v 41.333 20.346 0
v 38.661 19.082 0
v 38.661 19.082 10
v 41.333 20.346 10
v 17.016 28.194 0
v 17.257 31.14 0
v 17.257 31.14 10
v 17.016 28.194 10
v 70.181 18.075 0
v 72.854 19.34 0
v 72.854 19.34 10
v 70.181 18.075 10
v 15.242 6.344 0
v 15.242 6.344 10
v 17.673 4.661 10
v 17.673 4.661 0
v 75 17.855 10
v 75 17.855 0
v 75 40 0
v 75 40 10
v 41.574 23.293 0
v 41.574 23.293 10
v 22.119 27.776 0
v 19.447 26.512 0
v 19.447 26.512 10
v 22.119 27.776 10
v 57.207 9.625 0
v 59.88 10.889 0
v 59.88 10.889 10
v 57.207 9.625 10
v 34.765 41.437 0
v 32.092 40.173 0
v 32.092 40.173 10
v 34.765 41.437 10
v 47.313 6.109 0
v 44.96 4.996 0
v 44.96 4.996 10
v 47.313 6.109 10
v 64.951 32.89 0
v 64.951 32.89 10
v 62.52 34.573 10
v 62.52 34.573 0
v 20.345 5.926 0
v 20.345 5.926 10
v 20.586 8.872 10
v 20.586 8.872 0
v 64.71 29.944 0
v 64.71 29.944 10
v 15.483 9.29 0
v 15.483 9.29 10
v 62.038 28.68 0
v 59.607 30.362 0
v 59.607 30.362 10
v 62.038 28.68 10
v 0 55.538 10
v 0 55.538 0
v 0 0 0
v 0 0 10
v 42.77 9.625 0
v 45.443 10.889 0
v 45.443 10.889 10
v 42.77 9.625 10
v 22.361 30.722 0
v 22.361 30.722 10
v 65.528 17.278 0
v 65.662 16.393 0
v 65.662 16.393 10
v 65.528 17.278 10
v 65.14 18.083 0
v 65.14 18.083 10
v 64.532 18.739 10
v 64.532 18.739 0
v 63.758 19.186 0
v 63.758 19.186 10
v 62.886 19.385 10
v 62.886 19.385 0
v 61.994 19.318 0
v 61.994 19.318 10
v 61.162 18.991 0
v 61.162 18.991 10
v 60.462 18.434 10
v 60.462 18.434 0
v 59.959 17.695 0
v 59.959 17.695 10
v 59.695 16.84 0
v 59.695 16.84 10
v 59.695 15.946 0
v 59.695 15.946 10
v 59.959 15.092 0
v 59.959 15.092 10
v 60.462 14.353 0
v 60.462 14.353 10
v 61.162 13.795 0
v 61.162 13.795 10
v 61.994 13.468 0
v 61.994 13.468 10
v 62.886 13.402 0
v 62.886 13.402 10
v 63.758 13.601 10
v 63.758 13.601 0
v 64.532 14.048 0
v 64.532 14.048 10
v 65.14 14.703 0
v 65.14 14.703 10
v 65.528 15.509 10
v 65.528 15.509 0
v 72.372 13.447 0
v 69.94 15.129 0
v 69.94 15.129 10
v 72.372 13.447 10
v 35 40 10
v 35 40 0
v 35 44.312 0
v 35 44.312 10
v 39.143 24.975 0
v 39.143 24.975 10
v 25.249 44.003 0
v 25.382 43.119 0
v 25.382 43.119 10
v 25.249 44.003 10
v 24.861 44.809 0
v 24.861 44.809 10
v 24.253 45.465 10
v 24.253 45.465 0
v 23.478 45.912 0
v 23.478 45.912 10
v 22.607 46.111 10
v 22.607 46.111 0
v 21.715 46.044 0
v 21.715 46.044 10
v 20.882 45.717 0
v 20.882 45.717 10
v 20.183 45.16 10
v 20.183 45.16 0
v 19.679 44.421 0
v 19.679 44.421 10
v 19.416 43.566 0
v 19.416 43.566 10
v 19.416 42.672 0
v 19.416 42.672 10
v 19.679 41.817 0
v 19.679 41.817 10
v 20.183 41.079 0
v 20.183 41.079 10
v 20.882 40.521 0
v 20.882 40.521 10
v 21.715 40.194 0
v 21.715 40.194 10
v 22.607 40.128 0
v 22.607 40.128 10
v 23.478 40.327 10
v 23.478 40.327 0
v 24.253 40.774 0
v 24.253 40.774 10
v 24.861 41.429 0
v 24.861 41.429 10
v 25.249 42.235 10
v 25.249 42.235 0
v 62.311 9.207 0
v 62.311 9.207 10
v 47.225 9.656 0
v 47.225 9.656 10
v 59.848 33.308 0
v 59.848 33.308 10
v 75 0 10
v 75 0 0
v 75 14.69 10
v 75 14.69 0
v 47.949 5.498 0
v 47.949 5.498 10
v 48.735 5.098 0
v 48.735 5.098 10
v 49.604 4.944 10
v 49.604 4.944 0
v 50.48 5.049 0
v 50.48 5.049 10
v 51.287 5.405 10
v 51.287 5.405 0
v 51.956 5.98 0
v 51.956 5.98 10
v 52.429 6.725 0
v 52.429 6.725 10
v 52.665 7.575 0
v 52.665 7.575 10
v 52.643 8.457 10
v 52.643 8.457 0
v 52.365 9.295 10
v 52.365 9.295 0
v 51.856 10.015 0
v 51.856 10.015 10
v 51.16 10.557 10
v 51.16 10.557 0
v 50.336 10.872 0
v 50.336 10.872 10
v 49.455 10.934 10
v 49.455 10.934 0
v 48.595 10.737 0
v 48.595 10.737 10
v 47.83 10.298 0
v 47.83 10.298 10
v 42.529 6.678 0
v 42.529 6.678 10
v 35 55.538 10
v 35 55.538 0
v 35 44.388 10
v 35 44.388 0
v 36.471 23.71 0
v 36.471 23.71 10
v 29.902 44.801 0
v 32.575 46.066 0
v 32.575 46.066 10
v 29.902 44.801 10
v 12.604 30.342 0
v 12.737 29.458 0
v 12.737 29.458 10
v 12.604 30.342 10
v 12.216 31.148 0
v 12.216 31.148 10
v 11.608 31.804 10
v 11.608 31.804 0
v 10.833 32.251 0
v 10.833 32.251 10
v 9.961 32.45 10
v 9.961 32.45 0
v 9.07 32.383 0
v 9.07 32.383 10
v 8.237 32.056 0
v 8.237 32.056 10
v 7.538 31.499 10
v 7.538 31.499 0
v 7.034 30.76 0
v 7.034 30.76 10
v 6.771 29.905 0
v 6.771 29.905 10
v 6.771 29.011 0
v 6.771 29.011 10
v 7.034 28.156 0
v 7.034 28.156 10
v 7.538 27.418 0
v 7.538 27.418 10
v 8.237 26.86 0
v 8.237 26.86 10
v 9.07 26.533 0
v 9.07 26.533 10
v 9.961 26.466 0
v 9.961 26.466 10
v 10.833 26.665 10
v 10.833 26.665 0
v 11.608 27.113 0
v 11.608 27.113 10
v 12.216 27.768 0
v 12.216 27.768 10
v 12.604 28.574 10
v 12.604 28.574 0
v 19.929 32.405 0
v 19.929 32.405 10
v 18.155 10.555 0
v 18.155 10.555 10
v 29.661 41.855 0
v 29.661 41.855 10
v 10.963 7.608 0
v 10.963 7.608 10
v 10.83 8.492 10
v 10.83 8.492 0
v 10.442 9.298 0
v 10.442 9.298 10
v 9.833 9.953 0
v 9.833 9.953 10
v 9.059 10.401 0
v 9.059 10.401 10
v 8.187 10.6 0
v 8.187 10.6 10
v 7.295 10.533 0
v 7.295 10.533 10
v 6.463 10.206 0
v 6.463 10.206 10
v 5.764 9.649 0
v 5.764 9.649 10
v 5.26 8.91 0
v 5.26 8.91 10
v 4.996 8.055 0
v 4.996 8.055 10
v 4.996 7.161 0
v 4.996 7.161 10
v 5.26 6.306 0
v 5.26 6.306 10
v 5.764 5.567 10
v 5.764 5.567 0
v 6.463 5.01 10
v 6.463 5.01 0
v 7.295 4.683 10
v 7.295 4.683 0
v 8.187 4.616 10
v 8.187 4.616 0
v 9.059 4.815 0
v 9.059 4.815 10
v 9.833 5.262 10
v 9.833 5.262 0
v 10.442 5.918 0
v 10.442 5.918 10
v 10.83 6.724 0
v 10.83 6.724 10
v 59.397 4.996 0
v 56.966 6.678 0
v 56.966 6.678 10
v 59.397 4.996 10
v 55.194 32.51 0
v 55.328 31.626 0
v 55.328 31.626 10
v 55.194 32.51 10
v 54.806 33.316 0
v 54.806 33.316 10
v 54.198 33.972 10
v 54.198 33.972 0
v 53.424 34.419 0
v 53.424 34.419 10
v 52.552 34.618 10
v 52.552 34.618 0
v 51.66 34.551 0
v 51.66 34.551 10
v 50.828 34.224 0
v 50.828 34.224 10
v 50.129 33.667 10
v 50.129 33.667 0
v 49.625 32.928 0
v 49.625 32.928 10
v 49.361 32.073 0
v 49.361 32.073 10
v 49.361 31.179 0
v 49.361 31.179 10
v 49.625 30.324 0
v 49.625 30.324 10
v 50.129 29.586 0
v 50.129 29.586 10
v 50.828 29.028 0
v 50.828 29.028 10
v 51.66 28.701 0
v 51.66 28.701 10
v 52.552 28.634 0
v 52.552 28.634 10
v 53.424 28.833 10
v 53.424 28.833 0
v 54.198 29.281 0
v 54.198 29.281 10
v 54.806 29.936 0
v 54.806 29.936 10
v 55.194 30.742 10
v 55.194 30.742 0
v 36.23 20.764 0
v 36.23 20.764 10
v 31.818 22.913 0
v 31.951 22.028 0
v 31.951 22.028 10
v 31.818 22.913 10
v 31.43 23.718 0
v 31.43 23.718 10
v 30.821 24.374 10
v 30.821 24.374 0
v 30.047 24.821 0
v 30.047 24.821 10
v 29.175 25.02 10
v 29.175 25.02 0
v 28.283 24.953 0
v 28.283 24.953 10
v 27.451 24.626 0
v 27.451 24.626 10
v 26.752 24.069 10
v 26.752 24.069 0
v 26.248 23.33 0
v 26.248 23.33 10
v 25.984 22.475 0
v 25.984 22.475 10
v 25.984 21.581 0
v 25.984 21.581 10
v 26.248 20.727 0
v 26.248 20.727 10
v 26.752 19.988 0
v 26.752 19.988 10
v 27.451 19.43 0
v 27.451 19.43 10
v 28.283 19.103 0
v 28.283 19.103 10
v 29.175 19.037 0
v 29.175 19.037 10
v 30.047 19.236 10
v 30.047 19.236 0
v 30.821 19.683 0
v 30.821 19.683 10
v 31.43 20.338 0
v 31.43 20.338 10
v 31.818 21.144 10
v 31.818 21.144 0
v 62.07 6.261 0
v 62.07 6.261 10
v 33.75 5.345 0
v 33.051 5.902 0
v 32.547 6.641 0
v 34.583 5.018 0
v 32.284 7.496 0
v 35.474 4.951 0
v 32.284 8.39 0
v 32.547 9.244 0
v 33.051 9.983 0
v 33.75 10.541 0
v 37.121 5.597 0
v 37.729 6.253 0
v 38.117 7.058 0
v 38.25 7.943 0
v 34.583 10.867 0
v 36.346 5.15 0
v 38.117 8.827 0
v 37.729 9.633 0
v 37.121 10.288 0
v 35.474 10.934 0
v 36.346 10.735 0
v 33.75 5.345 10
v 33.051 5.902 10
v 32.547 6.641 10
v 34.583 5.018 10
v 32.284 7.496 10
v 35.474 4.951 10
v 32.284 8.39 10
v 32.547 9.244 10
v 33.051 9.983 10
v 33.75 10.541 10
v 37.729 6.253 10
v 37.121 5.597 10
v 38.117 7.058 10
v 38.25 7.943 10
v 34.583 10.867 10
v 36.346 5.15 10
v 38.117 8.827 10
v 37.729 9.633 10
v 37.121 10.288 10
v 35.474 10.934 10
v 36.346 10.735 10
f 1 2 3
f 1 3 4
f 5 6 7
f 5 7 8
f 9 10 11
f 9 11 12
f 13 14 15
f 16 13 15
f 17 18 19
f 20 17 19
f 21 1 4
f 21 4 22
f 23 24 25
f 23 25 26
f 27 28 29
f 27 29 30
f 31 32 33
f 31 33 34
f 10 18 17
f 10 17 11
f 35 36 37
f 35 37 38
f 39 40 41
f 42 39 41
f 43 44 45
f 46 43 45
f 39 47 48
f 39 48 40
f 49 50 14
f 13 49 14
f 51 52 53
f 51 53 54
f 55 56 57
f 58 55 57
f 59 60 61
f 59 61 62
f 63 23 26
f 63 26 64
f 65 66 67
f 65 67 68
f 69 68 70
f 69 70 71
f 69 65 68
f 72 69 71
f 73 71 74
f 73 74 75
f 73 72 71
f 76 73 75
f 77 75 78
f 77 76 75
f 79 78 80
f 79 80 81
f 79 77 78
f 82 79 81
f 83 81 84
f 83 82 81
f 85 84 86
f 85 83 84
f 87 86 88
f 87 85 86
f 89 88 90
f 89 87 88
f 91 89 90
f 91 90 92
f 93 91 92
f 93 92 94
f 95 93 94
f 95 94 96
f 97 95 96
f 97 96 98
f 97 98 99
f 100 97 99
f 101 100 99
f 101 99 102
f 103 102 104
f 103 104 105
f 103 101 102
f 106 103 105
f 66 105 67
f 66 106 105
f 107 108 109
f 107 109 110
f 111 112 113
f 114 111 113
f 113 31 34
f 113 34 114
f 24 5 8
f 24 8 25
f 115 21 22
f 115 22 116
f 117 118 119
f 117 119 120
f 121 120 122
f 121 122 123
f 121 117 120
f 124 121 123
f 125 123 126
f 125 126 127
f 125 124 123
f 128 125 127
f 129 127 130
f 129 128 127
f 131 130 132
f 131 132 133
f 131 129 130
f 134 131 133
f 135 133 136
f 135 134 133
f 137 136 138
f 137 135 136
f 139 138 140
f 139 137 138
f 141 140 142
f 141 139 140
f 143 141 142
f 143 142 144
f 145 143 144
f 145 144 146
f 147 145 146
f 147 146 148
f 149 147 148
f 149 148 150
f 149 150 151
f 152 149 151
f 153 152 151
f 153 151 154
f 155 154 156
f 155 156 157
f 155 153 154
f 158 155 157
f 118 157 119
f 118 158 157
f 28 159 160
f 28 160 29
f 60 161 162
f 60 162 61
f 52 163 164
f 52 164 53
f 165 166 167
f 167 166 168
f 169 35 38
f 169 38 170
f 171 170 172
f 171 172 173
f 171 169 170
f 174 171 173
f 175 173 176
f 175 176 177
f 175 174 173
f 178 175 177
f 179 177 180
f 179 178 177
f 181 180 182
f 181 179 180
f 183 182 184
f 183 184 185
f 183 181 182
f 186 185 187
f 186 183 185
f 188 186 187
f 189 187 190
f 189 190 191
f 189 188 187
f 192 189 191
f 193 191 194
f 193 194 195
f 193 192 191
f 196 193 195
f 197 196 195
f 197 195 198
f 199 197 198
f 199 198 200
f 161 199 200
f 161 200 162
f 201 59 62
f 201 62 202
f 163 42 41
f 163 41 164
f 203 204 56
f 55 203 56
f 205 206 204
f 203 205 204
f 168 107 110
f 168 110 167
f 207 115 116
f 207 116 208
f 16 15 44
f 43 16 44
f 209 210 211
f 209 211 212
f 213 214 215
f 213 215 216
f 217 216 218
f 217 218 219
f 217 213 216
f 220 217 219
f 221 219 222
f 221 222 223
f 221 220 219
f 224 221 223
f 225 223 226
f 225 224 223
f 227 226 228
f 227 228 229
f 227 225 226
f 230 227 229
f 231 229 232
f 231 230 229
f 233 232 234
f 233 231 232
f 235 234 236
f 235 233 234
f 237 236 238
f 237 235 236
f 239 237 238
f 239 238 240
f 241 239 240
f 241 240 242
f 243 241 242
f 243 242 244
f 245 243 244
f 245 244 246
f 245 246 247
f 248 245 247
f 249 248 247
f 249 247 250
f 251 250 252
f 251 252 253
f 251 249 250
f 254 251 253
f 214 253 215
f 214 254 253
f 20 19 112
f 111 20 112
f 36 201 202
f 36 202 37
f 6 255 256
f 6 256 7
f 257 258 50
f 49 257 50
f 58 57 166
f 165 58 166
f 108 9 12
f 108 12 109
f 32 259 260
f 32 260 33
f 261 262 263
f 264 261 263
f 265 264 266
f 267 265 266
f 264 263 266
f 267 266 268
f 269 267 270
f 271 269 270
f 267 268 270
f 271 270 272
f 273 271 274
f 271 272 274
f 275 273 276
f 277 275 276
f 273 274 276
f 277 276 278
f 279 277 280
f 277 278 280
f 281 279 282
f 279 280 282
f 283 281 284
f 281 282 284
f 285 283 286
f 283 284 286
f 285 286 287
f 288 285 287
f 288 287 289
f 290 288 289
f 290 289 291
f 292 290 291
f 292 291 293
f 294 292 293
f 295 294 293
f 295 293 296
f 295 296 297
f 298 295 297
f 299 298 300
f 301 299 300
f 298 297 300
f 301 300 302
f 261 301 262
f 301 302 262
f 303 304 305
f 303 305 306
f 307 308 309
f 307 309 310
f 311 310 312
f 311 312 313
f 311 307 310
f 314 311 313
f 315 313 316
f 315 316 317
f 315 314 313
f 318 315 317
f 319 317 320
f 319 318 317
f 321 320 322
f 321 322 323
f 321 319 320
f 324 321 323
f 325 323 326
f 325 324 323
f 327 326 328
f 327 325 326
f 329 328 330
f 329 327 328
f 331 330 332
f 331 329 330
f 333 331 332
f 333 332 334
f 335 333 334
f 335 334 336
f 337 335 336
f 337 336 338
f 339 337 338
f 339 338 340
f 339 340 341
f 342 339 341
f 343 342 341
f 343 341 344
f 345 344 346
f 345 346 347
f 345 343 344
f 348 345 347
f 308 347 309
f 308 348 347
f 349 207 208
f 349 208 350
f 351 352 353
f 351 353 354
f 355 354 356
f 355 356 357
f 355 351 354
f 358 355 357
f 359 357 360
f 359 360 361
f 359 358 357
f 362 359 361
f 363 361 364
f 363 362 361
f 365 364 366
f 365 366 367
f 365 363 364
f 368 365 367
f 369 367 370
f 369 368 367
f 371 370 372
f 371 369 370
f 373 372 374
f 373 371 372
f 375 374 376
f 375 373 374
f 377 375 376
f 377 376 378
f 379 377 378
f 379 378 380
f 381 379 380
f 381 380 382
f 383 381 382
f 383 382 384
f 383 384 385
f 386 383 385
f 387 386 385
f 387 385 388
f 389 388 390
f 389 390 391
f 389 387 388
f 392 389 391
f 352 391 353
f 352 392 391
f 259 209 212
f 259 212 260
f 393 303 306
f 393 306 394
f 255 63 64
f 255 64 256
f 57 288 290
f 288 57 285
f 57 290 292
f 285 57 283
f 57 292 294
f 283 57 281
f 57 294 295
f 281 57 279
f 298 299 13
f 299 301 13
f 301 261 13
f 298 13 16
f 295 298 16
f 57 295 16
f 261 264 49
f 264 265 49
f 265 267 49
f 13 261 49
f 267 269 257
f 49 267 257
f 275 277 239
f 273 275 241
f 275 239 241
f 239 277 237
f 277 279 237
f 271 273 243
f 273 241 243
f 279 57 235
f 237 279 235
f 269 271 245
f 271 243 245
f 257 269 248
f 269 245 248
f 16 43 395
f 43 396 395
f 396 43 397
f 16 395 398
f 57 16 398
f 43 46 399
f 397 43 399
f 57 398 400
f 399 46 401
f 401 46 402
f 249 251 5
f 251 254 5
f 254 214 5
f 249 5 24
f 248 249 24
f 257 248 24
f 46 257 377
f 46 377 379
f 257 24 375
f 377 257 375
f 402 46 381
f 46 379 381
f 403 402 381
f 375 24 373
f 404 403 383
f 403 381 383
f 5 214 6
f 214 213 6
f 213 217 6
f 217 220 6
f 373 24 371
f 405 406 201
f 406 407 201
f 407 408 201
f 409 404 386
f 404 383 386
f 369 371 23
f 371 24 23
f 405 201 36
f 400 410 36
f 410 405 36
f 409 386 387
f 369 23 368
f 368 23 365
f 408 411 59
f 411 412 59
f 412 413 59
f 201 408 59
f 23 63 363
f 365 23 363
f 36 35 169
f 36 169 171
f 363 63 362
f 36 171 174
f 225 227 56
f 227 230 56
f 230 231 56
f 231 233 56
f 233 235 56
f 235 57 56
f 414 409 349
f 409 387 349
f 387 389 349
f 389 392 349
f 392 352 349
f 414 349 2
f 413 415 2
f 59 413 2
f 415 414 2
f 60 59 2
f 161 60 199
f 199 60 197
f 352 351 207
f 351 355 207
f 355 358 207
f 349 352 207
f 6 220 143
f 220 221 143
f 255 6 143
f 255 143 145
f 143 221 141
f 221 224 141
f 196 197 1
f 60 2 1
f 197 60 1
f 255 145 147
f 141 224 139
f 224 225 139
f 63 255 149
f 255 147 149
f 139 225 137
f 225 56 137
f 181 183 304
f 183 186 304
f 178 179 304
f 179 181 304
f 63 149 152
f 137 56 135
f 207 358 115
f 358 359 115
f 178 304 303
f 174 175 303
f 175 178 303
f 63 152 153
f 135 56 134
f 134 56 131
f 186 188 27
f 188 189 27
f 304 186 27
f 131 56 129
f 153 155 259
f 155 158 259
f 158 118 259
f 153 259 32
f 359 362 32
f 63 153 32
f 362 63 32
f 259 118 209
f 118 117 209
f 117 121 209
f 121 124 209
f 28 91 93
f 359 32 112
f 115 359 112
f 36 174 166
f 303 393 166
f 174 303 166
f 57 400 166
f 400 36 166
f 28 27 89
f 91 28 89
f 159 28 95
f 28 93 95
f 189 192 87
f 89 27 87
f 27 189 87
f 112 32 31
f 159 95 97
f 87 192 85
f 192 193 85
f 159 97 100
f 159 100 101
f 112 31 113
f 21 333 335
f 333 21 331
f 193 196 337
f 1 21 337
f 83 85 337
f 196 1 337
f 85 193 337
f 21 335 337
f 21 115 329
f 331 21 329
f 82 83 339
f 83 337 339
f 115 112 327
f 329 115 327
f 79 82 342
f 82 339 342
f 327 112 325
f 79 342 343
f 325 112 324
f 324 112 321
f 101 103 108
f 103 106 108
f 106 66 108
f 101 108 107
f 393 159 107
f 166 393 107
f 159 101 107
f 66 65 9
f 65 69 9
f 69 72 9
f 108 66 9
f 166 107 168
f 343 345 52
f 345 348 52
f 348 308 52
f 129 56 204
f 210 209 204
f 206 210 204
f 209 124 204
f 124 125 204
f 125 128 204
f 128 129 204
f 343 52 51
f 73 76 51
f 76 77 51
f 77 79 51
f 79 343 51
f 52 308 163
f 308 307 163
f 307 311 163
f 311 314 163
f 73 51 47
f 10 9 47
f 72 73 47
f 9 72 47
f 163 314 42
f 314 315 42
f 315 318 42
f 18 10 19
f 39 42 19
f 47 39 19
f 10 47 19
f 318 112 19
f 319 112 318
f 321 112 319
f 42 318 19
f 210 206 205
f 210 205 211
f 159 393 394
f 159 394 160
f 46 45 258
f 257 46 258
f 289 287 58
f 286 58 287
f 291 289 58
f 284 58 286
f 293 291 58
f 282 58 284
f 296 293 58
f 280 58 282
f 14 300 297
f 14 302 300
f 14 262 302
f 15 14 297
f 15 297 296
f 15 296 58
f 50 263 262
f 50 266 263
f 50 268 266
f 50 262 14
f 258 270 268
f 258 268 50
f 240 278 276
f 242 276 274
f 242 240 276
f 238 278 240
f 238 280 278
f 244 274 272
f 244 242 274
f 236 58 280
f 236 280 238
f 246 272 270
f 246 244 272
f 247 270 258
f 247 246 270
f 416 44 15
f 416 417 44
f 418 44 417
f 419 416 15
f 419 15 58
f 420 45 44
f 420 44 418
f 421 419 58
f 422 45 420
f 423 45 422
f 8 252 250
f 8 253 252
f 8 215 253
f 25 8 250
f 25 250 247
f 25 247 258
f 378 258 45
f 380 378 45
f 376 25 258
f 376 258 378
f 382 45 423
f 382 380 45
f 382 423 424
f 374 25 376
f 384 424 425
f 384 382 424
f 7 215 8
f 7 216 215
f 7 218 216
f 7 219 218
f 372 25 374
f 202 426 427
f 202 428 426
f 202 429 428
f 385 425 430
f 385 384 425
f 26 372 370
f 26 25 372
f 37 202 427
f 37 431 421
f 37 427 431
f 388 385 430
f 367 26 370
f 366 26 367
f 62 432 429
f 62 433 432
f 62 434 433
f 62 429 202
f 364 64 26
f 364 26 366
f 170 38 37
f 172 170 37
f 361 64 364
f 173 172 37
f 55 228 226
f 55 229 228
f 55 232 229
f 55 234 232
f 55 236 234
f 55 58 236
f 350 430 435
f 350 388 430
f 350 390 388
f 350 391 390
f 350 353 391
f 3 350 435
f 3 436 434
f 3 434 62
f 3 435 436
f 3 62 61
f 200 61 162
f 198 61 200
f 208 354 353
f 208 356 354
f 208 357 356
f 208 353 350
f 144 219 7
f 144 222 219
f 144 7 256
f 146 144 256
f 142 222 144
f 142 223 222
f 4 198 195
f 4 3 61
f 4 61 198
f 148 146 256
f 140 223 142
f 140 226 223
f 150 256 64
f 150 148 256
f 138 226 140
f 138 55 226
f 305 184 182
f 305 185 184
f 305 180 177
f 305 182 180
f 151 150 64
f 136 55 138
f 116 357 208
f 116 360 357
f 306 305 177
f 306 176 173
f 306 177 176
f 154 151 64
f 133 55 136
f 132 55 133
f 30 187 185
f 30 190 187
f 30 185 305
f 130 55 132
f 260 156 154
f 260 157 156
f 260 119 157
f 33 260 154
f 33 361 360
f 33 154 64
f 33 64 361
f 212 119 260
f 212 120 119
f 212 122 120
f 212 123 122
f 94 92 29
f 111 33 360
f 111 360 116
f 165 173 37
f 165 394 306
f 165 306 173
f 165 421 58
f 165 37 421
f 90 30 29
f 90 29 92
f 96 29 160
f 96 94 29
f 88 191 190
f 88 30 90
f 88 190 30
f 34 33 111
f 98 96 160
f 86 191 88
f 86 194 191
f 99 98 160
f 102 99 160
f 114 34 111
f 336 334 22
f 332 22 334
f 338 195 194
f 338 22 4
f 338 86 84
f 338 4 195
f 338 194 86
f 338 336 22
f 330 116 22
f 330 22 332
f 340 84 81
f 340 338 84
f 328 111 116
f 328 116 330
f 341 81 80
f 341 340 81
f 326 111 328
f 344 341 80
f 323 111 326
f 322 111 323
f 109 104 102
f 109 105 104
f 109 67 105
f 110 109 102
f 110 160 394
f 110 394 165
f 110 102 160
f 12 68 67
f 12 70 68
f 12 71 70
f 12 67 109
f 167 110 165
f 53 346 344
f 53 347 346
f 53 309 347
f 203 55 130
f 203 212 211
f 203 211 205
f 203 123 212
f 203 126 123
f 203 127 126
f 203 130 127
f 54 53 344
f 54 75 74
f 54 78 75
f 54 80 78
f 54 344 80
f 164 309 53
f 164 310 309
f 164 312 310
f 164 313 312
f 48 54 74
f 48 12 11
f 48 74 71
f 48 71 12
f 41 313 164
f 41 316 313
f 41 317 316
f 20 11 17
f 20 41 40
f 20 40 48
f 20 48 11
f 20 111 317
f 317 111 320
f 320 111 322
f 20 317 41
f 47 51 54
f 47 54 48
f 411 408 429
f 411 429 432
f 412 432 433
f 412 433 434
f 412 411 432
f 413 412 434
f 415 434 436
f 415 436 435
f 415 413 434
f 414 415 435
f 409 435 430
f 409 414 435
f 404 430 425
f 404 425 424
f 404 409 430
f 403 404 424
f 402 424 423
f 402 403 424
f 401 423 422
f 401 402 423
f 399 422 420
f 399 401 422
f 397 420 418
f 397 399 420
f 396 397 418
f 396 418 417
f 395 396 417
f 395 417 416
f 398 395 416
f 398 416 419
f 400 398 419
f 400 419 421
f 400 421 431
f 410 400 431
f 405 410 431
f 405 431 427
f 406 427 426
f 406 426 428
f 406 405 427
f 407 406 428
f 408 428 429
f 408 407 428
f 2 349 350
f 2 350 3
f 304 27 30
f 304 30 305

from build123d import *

# Parameters (mm, degrees)
BOSS_EXTRUDE1_DEPTH       = 10
SKETCH2_R                 = 3
CUT_EXTRUDE1_DEPTH        = 10
SKETCH_PATTERN1_OUTLINE_R = 3
SKETCH_PATTERN1_DEPTH     = 10


# Read off the part's stored shape, not the designer's step: Sketch-Pattern1
with BuildPart() as part:
    # Sketch1 → Boss-Extrude1 (new body)
    with BuildSketch(Plane.XY):
        Polygon((0, 0), (75, 0), (75, 40), (35, 40), (35, 55.537974684), (0, 55.537974684), align=None)
    extrude(amount=BOSS_EXTRUDE1_DEPTH)

    # Sketch2 → Cut-Extrude1 (cut)
    with BuildSketch(Plane.XY.offset(10)):
        with Locations((7.962950949, 7.607986586)):
            Circle(SKETCH2_R)
        Polygon((20.345287783, 5.925870596), (20.586453467, 8.872391359), (18.155274475, 10.55450735), (15.482929799, 9.290102577), (15.241764115, 6.343581814), (17.672943107, 4.661465823), align=None)
    extrude(amount=-CUT_EXTRUDE1_DEPTH, mode=Mode.SUBTRACT)

    # Sketch-Pattern1 outline → Sketch-Pattern1 (cut)
    with BuildSketch(Plane.XY):
        with Locations((9.737115818, 29.458094158)):
            Circle(SKETCH_PATTERN1_OUTLINE_R)
        with Locations((52.327690787, 31.62602284)):
            Circle(SKETCH_PATTERN1_OUTLINE_R)
        Polygon((36.229757623, 20.763839411), (38.660936615, 19.08172342), (41.333281291, 20.346128193), (41.574446975, 23.292648956), (39.143267983, 24.974764947), (36.470923307, 23.710360174), align=None)
        with Locations((28.950944457, 22.028244183)):
            Circle(SKETCH_PATTERN1_OUTLINE_R)
        Polygon((35, 44.312366767), (35, 44.387559798), (32.574645536, 46.065645838), (29.90230086, 44.801241065), (29.661135176, 41.854720302), (32.092314168, 40.172604311), (34.764658844, 41.437009084), align=None)
        with Locations((22.38232201, 43.119125074)):
            Circle(SKETCH_PATTERN1_OUTLINE_R)
        Polygon((17.015928983, 28.193689386), (19.447107975, 26.511573395), (22.119452651, 27.775978168), (22.360618335, 30.722498931), (19.929439343, 32.404614922), (17.257094667, 31.140210149), align=None)
        Polygon((59.606503953, 30.361618067), (62.037682945, 28.679502076), (64.710027621, 29.943906849), (64.951193305, 32.890427612), (62.520014313, 34.572543603), (59.847669637, 33.30813883), align=None)
        with Locations((62.661508703, 16.393274831)):
            Circle(SKETCH_PATTERN1_OUTLINE_R)
        Polygon((69.940321868, 15.128870058), (72.37150086, 13.446754067), (75, 14.690413573), (75, 17.854876903), (72.853832228, 19.339795594), (70.181487552, 18.075390822), align=None)
        with Locations((35.250227337, 7.942687663)):
            Circle(SKETCH_PATTERN1_OUTLINE_R)
        Polygon((56.966278334, 6.67828289), (59.397457326, 4.996166899), (62.069802002, 6.260571672), (62.310967686, 9.207092435), (59.879788694, 10.889208426), (57.207444018, 9.624803653), align=None)
        with BuildLine():
            Line((44.960219495, 4.996166899), (47.312866175, 6.109308373))
            ThreePointArc((47.312866175, 6.109308373), (52.686542056, 8.017104238), (47.224860539, 9.656040644))
            Line((47.224860539, 9.656040644), (45.442550863, 10.889208426))
            Line((45.442550863, 10.889208426), (42.770206187, 9.624803653))
            Line((42.770206187, 9.624803653), (42.529040503, 6.67828289))
            Line((42.529040503, 6.67828289), (44.960219495, 4.996166899))
        make_face()
    extrude(amount=SKETCH_PATTERN1_DEPTH, mode=Mode.SUBTRACT)


solid = part.part
